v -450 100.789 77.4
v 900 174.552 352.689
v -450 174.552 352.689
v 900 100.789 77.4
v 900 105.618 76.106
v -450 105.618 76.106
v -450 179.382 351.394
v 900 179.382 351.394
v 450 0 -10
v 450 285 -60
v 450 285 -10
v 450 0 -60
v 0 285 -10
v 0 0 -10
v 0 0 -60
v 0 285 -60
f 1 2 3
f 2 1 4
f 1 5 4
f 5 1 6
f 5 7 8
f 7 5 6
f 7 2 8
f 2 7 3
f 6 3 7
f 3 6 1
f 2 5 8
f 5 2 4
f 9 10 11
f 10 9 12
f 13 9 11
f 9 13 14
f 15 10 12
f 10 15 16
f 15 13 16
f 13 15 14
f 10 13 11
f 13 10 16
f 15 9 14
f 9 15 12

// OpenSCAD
// file: time_utility.scad
// Utility functions to help manage time steps $t
// 2017/04/28 - Roger Cheng

// Returns 0-1 for the portion of time between start/end.
function timeRanged(start, current, end) = 
    current<=start? 0 : 
        (current>=end ? 1 : 
            ((current-start)/(end-start)));

// Symmetric animation 0 to 1 to 0 while $t goes 0 to 1
function timeSymmetric() = abs($t-0.5)*2;

// A little padding on either end of timeSymmetric()
padStart=0.1;
padEnd=0.9;
function timePadded() = timeRanged(padStart, timeSymmetric(), padEnd);
// main file
// Tri-screen concept "Swiss Army Knife"
// 2017/05/10 - Roger Cheng
use <time_utility.scad>

screenW = 450;
screenH = 285;
screenD = 5;

bodyW = screenW;
bodyH = screenH;
bodyD = 50;

// Time utilities
function scrOpen() = timeRanged(0, timePadded(), 1);
function scrUnfold() = timeRanged(0.2, timePadded(), 1.0);

// Physical construction

module screen()
{
    cube([screenW, screenH, screenD]);
}

module center()
{
    screen();
}

module left()
{
    translate([0, screenH/2, screenD*scrUnfold()])
    rotate([0, 0, 180*scrUnfold()])
    translate([0, -screenH/2, -screenD])
    screen();
}

module right()
{
    translate([screenW, screenH/2, 0])
    translate([0, 0, screenD*2*scrUnfold()])
    rotate([0, 0, -180*scrUnfold()])
    translate([-screenW, -screenH/2, -screenD*2])
    screen();
}

module screenAssembly()
{
    translate([0, screenH/2, screenH*0.75*scrOpen()])
    rotate([75*scrOpen(), 0, 0])
    translate([0, -screenH/2, 0])
    union()
    {
        color([0.5, 0, 0]) left();
        color([0, 0.5, 0]) center();
        color([0, 0, 0.5]) right();
    }
}

module bodyAssembly()
{
    translate([0, 0, -bodyD-screenD*2])
    cube([bodyW, bodyH, bodyD]);
}

module masterAssembly()
{
    screenAssembly();
    bodyAssembly();
}

masterAssembly();
